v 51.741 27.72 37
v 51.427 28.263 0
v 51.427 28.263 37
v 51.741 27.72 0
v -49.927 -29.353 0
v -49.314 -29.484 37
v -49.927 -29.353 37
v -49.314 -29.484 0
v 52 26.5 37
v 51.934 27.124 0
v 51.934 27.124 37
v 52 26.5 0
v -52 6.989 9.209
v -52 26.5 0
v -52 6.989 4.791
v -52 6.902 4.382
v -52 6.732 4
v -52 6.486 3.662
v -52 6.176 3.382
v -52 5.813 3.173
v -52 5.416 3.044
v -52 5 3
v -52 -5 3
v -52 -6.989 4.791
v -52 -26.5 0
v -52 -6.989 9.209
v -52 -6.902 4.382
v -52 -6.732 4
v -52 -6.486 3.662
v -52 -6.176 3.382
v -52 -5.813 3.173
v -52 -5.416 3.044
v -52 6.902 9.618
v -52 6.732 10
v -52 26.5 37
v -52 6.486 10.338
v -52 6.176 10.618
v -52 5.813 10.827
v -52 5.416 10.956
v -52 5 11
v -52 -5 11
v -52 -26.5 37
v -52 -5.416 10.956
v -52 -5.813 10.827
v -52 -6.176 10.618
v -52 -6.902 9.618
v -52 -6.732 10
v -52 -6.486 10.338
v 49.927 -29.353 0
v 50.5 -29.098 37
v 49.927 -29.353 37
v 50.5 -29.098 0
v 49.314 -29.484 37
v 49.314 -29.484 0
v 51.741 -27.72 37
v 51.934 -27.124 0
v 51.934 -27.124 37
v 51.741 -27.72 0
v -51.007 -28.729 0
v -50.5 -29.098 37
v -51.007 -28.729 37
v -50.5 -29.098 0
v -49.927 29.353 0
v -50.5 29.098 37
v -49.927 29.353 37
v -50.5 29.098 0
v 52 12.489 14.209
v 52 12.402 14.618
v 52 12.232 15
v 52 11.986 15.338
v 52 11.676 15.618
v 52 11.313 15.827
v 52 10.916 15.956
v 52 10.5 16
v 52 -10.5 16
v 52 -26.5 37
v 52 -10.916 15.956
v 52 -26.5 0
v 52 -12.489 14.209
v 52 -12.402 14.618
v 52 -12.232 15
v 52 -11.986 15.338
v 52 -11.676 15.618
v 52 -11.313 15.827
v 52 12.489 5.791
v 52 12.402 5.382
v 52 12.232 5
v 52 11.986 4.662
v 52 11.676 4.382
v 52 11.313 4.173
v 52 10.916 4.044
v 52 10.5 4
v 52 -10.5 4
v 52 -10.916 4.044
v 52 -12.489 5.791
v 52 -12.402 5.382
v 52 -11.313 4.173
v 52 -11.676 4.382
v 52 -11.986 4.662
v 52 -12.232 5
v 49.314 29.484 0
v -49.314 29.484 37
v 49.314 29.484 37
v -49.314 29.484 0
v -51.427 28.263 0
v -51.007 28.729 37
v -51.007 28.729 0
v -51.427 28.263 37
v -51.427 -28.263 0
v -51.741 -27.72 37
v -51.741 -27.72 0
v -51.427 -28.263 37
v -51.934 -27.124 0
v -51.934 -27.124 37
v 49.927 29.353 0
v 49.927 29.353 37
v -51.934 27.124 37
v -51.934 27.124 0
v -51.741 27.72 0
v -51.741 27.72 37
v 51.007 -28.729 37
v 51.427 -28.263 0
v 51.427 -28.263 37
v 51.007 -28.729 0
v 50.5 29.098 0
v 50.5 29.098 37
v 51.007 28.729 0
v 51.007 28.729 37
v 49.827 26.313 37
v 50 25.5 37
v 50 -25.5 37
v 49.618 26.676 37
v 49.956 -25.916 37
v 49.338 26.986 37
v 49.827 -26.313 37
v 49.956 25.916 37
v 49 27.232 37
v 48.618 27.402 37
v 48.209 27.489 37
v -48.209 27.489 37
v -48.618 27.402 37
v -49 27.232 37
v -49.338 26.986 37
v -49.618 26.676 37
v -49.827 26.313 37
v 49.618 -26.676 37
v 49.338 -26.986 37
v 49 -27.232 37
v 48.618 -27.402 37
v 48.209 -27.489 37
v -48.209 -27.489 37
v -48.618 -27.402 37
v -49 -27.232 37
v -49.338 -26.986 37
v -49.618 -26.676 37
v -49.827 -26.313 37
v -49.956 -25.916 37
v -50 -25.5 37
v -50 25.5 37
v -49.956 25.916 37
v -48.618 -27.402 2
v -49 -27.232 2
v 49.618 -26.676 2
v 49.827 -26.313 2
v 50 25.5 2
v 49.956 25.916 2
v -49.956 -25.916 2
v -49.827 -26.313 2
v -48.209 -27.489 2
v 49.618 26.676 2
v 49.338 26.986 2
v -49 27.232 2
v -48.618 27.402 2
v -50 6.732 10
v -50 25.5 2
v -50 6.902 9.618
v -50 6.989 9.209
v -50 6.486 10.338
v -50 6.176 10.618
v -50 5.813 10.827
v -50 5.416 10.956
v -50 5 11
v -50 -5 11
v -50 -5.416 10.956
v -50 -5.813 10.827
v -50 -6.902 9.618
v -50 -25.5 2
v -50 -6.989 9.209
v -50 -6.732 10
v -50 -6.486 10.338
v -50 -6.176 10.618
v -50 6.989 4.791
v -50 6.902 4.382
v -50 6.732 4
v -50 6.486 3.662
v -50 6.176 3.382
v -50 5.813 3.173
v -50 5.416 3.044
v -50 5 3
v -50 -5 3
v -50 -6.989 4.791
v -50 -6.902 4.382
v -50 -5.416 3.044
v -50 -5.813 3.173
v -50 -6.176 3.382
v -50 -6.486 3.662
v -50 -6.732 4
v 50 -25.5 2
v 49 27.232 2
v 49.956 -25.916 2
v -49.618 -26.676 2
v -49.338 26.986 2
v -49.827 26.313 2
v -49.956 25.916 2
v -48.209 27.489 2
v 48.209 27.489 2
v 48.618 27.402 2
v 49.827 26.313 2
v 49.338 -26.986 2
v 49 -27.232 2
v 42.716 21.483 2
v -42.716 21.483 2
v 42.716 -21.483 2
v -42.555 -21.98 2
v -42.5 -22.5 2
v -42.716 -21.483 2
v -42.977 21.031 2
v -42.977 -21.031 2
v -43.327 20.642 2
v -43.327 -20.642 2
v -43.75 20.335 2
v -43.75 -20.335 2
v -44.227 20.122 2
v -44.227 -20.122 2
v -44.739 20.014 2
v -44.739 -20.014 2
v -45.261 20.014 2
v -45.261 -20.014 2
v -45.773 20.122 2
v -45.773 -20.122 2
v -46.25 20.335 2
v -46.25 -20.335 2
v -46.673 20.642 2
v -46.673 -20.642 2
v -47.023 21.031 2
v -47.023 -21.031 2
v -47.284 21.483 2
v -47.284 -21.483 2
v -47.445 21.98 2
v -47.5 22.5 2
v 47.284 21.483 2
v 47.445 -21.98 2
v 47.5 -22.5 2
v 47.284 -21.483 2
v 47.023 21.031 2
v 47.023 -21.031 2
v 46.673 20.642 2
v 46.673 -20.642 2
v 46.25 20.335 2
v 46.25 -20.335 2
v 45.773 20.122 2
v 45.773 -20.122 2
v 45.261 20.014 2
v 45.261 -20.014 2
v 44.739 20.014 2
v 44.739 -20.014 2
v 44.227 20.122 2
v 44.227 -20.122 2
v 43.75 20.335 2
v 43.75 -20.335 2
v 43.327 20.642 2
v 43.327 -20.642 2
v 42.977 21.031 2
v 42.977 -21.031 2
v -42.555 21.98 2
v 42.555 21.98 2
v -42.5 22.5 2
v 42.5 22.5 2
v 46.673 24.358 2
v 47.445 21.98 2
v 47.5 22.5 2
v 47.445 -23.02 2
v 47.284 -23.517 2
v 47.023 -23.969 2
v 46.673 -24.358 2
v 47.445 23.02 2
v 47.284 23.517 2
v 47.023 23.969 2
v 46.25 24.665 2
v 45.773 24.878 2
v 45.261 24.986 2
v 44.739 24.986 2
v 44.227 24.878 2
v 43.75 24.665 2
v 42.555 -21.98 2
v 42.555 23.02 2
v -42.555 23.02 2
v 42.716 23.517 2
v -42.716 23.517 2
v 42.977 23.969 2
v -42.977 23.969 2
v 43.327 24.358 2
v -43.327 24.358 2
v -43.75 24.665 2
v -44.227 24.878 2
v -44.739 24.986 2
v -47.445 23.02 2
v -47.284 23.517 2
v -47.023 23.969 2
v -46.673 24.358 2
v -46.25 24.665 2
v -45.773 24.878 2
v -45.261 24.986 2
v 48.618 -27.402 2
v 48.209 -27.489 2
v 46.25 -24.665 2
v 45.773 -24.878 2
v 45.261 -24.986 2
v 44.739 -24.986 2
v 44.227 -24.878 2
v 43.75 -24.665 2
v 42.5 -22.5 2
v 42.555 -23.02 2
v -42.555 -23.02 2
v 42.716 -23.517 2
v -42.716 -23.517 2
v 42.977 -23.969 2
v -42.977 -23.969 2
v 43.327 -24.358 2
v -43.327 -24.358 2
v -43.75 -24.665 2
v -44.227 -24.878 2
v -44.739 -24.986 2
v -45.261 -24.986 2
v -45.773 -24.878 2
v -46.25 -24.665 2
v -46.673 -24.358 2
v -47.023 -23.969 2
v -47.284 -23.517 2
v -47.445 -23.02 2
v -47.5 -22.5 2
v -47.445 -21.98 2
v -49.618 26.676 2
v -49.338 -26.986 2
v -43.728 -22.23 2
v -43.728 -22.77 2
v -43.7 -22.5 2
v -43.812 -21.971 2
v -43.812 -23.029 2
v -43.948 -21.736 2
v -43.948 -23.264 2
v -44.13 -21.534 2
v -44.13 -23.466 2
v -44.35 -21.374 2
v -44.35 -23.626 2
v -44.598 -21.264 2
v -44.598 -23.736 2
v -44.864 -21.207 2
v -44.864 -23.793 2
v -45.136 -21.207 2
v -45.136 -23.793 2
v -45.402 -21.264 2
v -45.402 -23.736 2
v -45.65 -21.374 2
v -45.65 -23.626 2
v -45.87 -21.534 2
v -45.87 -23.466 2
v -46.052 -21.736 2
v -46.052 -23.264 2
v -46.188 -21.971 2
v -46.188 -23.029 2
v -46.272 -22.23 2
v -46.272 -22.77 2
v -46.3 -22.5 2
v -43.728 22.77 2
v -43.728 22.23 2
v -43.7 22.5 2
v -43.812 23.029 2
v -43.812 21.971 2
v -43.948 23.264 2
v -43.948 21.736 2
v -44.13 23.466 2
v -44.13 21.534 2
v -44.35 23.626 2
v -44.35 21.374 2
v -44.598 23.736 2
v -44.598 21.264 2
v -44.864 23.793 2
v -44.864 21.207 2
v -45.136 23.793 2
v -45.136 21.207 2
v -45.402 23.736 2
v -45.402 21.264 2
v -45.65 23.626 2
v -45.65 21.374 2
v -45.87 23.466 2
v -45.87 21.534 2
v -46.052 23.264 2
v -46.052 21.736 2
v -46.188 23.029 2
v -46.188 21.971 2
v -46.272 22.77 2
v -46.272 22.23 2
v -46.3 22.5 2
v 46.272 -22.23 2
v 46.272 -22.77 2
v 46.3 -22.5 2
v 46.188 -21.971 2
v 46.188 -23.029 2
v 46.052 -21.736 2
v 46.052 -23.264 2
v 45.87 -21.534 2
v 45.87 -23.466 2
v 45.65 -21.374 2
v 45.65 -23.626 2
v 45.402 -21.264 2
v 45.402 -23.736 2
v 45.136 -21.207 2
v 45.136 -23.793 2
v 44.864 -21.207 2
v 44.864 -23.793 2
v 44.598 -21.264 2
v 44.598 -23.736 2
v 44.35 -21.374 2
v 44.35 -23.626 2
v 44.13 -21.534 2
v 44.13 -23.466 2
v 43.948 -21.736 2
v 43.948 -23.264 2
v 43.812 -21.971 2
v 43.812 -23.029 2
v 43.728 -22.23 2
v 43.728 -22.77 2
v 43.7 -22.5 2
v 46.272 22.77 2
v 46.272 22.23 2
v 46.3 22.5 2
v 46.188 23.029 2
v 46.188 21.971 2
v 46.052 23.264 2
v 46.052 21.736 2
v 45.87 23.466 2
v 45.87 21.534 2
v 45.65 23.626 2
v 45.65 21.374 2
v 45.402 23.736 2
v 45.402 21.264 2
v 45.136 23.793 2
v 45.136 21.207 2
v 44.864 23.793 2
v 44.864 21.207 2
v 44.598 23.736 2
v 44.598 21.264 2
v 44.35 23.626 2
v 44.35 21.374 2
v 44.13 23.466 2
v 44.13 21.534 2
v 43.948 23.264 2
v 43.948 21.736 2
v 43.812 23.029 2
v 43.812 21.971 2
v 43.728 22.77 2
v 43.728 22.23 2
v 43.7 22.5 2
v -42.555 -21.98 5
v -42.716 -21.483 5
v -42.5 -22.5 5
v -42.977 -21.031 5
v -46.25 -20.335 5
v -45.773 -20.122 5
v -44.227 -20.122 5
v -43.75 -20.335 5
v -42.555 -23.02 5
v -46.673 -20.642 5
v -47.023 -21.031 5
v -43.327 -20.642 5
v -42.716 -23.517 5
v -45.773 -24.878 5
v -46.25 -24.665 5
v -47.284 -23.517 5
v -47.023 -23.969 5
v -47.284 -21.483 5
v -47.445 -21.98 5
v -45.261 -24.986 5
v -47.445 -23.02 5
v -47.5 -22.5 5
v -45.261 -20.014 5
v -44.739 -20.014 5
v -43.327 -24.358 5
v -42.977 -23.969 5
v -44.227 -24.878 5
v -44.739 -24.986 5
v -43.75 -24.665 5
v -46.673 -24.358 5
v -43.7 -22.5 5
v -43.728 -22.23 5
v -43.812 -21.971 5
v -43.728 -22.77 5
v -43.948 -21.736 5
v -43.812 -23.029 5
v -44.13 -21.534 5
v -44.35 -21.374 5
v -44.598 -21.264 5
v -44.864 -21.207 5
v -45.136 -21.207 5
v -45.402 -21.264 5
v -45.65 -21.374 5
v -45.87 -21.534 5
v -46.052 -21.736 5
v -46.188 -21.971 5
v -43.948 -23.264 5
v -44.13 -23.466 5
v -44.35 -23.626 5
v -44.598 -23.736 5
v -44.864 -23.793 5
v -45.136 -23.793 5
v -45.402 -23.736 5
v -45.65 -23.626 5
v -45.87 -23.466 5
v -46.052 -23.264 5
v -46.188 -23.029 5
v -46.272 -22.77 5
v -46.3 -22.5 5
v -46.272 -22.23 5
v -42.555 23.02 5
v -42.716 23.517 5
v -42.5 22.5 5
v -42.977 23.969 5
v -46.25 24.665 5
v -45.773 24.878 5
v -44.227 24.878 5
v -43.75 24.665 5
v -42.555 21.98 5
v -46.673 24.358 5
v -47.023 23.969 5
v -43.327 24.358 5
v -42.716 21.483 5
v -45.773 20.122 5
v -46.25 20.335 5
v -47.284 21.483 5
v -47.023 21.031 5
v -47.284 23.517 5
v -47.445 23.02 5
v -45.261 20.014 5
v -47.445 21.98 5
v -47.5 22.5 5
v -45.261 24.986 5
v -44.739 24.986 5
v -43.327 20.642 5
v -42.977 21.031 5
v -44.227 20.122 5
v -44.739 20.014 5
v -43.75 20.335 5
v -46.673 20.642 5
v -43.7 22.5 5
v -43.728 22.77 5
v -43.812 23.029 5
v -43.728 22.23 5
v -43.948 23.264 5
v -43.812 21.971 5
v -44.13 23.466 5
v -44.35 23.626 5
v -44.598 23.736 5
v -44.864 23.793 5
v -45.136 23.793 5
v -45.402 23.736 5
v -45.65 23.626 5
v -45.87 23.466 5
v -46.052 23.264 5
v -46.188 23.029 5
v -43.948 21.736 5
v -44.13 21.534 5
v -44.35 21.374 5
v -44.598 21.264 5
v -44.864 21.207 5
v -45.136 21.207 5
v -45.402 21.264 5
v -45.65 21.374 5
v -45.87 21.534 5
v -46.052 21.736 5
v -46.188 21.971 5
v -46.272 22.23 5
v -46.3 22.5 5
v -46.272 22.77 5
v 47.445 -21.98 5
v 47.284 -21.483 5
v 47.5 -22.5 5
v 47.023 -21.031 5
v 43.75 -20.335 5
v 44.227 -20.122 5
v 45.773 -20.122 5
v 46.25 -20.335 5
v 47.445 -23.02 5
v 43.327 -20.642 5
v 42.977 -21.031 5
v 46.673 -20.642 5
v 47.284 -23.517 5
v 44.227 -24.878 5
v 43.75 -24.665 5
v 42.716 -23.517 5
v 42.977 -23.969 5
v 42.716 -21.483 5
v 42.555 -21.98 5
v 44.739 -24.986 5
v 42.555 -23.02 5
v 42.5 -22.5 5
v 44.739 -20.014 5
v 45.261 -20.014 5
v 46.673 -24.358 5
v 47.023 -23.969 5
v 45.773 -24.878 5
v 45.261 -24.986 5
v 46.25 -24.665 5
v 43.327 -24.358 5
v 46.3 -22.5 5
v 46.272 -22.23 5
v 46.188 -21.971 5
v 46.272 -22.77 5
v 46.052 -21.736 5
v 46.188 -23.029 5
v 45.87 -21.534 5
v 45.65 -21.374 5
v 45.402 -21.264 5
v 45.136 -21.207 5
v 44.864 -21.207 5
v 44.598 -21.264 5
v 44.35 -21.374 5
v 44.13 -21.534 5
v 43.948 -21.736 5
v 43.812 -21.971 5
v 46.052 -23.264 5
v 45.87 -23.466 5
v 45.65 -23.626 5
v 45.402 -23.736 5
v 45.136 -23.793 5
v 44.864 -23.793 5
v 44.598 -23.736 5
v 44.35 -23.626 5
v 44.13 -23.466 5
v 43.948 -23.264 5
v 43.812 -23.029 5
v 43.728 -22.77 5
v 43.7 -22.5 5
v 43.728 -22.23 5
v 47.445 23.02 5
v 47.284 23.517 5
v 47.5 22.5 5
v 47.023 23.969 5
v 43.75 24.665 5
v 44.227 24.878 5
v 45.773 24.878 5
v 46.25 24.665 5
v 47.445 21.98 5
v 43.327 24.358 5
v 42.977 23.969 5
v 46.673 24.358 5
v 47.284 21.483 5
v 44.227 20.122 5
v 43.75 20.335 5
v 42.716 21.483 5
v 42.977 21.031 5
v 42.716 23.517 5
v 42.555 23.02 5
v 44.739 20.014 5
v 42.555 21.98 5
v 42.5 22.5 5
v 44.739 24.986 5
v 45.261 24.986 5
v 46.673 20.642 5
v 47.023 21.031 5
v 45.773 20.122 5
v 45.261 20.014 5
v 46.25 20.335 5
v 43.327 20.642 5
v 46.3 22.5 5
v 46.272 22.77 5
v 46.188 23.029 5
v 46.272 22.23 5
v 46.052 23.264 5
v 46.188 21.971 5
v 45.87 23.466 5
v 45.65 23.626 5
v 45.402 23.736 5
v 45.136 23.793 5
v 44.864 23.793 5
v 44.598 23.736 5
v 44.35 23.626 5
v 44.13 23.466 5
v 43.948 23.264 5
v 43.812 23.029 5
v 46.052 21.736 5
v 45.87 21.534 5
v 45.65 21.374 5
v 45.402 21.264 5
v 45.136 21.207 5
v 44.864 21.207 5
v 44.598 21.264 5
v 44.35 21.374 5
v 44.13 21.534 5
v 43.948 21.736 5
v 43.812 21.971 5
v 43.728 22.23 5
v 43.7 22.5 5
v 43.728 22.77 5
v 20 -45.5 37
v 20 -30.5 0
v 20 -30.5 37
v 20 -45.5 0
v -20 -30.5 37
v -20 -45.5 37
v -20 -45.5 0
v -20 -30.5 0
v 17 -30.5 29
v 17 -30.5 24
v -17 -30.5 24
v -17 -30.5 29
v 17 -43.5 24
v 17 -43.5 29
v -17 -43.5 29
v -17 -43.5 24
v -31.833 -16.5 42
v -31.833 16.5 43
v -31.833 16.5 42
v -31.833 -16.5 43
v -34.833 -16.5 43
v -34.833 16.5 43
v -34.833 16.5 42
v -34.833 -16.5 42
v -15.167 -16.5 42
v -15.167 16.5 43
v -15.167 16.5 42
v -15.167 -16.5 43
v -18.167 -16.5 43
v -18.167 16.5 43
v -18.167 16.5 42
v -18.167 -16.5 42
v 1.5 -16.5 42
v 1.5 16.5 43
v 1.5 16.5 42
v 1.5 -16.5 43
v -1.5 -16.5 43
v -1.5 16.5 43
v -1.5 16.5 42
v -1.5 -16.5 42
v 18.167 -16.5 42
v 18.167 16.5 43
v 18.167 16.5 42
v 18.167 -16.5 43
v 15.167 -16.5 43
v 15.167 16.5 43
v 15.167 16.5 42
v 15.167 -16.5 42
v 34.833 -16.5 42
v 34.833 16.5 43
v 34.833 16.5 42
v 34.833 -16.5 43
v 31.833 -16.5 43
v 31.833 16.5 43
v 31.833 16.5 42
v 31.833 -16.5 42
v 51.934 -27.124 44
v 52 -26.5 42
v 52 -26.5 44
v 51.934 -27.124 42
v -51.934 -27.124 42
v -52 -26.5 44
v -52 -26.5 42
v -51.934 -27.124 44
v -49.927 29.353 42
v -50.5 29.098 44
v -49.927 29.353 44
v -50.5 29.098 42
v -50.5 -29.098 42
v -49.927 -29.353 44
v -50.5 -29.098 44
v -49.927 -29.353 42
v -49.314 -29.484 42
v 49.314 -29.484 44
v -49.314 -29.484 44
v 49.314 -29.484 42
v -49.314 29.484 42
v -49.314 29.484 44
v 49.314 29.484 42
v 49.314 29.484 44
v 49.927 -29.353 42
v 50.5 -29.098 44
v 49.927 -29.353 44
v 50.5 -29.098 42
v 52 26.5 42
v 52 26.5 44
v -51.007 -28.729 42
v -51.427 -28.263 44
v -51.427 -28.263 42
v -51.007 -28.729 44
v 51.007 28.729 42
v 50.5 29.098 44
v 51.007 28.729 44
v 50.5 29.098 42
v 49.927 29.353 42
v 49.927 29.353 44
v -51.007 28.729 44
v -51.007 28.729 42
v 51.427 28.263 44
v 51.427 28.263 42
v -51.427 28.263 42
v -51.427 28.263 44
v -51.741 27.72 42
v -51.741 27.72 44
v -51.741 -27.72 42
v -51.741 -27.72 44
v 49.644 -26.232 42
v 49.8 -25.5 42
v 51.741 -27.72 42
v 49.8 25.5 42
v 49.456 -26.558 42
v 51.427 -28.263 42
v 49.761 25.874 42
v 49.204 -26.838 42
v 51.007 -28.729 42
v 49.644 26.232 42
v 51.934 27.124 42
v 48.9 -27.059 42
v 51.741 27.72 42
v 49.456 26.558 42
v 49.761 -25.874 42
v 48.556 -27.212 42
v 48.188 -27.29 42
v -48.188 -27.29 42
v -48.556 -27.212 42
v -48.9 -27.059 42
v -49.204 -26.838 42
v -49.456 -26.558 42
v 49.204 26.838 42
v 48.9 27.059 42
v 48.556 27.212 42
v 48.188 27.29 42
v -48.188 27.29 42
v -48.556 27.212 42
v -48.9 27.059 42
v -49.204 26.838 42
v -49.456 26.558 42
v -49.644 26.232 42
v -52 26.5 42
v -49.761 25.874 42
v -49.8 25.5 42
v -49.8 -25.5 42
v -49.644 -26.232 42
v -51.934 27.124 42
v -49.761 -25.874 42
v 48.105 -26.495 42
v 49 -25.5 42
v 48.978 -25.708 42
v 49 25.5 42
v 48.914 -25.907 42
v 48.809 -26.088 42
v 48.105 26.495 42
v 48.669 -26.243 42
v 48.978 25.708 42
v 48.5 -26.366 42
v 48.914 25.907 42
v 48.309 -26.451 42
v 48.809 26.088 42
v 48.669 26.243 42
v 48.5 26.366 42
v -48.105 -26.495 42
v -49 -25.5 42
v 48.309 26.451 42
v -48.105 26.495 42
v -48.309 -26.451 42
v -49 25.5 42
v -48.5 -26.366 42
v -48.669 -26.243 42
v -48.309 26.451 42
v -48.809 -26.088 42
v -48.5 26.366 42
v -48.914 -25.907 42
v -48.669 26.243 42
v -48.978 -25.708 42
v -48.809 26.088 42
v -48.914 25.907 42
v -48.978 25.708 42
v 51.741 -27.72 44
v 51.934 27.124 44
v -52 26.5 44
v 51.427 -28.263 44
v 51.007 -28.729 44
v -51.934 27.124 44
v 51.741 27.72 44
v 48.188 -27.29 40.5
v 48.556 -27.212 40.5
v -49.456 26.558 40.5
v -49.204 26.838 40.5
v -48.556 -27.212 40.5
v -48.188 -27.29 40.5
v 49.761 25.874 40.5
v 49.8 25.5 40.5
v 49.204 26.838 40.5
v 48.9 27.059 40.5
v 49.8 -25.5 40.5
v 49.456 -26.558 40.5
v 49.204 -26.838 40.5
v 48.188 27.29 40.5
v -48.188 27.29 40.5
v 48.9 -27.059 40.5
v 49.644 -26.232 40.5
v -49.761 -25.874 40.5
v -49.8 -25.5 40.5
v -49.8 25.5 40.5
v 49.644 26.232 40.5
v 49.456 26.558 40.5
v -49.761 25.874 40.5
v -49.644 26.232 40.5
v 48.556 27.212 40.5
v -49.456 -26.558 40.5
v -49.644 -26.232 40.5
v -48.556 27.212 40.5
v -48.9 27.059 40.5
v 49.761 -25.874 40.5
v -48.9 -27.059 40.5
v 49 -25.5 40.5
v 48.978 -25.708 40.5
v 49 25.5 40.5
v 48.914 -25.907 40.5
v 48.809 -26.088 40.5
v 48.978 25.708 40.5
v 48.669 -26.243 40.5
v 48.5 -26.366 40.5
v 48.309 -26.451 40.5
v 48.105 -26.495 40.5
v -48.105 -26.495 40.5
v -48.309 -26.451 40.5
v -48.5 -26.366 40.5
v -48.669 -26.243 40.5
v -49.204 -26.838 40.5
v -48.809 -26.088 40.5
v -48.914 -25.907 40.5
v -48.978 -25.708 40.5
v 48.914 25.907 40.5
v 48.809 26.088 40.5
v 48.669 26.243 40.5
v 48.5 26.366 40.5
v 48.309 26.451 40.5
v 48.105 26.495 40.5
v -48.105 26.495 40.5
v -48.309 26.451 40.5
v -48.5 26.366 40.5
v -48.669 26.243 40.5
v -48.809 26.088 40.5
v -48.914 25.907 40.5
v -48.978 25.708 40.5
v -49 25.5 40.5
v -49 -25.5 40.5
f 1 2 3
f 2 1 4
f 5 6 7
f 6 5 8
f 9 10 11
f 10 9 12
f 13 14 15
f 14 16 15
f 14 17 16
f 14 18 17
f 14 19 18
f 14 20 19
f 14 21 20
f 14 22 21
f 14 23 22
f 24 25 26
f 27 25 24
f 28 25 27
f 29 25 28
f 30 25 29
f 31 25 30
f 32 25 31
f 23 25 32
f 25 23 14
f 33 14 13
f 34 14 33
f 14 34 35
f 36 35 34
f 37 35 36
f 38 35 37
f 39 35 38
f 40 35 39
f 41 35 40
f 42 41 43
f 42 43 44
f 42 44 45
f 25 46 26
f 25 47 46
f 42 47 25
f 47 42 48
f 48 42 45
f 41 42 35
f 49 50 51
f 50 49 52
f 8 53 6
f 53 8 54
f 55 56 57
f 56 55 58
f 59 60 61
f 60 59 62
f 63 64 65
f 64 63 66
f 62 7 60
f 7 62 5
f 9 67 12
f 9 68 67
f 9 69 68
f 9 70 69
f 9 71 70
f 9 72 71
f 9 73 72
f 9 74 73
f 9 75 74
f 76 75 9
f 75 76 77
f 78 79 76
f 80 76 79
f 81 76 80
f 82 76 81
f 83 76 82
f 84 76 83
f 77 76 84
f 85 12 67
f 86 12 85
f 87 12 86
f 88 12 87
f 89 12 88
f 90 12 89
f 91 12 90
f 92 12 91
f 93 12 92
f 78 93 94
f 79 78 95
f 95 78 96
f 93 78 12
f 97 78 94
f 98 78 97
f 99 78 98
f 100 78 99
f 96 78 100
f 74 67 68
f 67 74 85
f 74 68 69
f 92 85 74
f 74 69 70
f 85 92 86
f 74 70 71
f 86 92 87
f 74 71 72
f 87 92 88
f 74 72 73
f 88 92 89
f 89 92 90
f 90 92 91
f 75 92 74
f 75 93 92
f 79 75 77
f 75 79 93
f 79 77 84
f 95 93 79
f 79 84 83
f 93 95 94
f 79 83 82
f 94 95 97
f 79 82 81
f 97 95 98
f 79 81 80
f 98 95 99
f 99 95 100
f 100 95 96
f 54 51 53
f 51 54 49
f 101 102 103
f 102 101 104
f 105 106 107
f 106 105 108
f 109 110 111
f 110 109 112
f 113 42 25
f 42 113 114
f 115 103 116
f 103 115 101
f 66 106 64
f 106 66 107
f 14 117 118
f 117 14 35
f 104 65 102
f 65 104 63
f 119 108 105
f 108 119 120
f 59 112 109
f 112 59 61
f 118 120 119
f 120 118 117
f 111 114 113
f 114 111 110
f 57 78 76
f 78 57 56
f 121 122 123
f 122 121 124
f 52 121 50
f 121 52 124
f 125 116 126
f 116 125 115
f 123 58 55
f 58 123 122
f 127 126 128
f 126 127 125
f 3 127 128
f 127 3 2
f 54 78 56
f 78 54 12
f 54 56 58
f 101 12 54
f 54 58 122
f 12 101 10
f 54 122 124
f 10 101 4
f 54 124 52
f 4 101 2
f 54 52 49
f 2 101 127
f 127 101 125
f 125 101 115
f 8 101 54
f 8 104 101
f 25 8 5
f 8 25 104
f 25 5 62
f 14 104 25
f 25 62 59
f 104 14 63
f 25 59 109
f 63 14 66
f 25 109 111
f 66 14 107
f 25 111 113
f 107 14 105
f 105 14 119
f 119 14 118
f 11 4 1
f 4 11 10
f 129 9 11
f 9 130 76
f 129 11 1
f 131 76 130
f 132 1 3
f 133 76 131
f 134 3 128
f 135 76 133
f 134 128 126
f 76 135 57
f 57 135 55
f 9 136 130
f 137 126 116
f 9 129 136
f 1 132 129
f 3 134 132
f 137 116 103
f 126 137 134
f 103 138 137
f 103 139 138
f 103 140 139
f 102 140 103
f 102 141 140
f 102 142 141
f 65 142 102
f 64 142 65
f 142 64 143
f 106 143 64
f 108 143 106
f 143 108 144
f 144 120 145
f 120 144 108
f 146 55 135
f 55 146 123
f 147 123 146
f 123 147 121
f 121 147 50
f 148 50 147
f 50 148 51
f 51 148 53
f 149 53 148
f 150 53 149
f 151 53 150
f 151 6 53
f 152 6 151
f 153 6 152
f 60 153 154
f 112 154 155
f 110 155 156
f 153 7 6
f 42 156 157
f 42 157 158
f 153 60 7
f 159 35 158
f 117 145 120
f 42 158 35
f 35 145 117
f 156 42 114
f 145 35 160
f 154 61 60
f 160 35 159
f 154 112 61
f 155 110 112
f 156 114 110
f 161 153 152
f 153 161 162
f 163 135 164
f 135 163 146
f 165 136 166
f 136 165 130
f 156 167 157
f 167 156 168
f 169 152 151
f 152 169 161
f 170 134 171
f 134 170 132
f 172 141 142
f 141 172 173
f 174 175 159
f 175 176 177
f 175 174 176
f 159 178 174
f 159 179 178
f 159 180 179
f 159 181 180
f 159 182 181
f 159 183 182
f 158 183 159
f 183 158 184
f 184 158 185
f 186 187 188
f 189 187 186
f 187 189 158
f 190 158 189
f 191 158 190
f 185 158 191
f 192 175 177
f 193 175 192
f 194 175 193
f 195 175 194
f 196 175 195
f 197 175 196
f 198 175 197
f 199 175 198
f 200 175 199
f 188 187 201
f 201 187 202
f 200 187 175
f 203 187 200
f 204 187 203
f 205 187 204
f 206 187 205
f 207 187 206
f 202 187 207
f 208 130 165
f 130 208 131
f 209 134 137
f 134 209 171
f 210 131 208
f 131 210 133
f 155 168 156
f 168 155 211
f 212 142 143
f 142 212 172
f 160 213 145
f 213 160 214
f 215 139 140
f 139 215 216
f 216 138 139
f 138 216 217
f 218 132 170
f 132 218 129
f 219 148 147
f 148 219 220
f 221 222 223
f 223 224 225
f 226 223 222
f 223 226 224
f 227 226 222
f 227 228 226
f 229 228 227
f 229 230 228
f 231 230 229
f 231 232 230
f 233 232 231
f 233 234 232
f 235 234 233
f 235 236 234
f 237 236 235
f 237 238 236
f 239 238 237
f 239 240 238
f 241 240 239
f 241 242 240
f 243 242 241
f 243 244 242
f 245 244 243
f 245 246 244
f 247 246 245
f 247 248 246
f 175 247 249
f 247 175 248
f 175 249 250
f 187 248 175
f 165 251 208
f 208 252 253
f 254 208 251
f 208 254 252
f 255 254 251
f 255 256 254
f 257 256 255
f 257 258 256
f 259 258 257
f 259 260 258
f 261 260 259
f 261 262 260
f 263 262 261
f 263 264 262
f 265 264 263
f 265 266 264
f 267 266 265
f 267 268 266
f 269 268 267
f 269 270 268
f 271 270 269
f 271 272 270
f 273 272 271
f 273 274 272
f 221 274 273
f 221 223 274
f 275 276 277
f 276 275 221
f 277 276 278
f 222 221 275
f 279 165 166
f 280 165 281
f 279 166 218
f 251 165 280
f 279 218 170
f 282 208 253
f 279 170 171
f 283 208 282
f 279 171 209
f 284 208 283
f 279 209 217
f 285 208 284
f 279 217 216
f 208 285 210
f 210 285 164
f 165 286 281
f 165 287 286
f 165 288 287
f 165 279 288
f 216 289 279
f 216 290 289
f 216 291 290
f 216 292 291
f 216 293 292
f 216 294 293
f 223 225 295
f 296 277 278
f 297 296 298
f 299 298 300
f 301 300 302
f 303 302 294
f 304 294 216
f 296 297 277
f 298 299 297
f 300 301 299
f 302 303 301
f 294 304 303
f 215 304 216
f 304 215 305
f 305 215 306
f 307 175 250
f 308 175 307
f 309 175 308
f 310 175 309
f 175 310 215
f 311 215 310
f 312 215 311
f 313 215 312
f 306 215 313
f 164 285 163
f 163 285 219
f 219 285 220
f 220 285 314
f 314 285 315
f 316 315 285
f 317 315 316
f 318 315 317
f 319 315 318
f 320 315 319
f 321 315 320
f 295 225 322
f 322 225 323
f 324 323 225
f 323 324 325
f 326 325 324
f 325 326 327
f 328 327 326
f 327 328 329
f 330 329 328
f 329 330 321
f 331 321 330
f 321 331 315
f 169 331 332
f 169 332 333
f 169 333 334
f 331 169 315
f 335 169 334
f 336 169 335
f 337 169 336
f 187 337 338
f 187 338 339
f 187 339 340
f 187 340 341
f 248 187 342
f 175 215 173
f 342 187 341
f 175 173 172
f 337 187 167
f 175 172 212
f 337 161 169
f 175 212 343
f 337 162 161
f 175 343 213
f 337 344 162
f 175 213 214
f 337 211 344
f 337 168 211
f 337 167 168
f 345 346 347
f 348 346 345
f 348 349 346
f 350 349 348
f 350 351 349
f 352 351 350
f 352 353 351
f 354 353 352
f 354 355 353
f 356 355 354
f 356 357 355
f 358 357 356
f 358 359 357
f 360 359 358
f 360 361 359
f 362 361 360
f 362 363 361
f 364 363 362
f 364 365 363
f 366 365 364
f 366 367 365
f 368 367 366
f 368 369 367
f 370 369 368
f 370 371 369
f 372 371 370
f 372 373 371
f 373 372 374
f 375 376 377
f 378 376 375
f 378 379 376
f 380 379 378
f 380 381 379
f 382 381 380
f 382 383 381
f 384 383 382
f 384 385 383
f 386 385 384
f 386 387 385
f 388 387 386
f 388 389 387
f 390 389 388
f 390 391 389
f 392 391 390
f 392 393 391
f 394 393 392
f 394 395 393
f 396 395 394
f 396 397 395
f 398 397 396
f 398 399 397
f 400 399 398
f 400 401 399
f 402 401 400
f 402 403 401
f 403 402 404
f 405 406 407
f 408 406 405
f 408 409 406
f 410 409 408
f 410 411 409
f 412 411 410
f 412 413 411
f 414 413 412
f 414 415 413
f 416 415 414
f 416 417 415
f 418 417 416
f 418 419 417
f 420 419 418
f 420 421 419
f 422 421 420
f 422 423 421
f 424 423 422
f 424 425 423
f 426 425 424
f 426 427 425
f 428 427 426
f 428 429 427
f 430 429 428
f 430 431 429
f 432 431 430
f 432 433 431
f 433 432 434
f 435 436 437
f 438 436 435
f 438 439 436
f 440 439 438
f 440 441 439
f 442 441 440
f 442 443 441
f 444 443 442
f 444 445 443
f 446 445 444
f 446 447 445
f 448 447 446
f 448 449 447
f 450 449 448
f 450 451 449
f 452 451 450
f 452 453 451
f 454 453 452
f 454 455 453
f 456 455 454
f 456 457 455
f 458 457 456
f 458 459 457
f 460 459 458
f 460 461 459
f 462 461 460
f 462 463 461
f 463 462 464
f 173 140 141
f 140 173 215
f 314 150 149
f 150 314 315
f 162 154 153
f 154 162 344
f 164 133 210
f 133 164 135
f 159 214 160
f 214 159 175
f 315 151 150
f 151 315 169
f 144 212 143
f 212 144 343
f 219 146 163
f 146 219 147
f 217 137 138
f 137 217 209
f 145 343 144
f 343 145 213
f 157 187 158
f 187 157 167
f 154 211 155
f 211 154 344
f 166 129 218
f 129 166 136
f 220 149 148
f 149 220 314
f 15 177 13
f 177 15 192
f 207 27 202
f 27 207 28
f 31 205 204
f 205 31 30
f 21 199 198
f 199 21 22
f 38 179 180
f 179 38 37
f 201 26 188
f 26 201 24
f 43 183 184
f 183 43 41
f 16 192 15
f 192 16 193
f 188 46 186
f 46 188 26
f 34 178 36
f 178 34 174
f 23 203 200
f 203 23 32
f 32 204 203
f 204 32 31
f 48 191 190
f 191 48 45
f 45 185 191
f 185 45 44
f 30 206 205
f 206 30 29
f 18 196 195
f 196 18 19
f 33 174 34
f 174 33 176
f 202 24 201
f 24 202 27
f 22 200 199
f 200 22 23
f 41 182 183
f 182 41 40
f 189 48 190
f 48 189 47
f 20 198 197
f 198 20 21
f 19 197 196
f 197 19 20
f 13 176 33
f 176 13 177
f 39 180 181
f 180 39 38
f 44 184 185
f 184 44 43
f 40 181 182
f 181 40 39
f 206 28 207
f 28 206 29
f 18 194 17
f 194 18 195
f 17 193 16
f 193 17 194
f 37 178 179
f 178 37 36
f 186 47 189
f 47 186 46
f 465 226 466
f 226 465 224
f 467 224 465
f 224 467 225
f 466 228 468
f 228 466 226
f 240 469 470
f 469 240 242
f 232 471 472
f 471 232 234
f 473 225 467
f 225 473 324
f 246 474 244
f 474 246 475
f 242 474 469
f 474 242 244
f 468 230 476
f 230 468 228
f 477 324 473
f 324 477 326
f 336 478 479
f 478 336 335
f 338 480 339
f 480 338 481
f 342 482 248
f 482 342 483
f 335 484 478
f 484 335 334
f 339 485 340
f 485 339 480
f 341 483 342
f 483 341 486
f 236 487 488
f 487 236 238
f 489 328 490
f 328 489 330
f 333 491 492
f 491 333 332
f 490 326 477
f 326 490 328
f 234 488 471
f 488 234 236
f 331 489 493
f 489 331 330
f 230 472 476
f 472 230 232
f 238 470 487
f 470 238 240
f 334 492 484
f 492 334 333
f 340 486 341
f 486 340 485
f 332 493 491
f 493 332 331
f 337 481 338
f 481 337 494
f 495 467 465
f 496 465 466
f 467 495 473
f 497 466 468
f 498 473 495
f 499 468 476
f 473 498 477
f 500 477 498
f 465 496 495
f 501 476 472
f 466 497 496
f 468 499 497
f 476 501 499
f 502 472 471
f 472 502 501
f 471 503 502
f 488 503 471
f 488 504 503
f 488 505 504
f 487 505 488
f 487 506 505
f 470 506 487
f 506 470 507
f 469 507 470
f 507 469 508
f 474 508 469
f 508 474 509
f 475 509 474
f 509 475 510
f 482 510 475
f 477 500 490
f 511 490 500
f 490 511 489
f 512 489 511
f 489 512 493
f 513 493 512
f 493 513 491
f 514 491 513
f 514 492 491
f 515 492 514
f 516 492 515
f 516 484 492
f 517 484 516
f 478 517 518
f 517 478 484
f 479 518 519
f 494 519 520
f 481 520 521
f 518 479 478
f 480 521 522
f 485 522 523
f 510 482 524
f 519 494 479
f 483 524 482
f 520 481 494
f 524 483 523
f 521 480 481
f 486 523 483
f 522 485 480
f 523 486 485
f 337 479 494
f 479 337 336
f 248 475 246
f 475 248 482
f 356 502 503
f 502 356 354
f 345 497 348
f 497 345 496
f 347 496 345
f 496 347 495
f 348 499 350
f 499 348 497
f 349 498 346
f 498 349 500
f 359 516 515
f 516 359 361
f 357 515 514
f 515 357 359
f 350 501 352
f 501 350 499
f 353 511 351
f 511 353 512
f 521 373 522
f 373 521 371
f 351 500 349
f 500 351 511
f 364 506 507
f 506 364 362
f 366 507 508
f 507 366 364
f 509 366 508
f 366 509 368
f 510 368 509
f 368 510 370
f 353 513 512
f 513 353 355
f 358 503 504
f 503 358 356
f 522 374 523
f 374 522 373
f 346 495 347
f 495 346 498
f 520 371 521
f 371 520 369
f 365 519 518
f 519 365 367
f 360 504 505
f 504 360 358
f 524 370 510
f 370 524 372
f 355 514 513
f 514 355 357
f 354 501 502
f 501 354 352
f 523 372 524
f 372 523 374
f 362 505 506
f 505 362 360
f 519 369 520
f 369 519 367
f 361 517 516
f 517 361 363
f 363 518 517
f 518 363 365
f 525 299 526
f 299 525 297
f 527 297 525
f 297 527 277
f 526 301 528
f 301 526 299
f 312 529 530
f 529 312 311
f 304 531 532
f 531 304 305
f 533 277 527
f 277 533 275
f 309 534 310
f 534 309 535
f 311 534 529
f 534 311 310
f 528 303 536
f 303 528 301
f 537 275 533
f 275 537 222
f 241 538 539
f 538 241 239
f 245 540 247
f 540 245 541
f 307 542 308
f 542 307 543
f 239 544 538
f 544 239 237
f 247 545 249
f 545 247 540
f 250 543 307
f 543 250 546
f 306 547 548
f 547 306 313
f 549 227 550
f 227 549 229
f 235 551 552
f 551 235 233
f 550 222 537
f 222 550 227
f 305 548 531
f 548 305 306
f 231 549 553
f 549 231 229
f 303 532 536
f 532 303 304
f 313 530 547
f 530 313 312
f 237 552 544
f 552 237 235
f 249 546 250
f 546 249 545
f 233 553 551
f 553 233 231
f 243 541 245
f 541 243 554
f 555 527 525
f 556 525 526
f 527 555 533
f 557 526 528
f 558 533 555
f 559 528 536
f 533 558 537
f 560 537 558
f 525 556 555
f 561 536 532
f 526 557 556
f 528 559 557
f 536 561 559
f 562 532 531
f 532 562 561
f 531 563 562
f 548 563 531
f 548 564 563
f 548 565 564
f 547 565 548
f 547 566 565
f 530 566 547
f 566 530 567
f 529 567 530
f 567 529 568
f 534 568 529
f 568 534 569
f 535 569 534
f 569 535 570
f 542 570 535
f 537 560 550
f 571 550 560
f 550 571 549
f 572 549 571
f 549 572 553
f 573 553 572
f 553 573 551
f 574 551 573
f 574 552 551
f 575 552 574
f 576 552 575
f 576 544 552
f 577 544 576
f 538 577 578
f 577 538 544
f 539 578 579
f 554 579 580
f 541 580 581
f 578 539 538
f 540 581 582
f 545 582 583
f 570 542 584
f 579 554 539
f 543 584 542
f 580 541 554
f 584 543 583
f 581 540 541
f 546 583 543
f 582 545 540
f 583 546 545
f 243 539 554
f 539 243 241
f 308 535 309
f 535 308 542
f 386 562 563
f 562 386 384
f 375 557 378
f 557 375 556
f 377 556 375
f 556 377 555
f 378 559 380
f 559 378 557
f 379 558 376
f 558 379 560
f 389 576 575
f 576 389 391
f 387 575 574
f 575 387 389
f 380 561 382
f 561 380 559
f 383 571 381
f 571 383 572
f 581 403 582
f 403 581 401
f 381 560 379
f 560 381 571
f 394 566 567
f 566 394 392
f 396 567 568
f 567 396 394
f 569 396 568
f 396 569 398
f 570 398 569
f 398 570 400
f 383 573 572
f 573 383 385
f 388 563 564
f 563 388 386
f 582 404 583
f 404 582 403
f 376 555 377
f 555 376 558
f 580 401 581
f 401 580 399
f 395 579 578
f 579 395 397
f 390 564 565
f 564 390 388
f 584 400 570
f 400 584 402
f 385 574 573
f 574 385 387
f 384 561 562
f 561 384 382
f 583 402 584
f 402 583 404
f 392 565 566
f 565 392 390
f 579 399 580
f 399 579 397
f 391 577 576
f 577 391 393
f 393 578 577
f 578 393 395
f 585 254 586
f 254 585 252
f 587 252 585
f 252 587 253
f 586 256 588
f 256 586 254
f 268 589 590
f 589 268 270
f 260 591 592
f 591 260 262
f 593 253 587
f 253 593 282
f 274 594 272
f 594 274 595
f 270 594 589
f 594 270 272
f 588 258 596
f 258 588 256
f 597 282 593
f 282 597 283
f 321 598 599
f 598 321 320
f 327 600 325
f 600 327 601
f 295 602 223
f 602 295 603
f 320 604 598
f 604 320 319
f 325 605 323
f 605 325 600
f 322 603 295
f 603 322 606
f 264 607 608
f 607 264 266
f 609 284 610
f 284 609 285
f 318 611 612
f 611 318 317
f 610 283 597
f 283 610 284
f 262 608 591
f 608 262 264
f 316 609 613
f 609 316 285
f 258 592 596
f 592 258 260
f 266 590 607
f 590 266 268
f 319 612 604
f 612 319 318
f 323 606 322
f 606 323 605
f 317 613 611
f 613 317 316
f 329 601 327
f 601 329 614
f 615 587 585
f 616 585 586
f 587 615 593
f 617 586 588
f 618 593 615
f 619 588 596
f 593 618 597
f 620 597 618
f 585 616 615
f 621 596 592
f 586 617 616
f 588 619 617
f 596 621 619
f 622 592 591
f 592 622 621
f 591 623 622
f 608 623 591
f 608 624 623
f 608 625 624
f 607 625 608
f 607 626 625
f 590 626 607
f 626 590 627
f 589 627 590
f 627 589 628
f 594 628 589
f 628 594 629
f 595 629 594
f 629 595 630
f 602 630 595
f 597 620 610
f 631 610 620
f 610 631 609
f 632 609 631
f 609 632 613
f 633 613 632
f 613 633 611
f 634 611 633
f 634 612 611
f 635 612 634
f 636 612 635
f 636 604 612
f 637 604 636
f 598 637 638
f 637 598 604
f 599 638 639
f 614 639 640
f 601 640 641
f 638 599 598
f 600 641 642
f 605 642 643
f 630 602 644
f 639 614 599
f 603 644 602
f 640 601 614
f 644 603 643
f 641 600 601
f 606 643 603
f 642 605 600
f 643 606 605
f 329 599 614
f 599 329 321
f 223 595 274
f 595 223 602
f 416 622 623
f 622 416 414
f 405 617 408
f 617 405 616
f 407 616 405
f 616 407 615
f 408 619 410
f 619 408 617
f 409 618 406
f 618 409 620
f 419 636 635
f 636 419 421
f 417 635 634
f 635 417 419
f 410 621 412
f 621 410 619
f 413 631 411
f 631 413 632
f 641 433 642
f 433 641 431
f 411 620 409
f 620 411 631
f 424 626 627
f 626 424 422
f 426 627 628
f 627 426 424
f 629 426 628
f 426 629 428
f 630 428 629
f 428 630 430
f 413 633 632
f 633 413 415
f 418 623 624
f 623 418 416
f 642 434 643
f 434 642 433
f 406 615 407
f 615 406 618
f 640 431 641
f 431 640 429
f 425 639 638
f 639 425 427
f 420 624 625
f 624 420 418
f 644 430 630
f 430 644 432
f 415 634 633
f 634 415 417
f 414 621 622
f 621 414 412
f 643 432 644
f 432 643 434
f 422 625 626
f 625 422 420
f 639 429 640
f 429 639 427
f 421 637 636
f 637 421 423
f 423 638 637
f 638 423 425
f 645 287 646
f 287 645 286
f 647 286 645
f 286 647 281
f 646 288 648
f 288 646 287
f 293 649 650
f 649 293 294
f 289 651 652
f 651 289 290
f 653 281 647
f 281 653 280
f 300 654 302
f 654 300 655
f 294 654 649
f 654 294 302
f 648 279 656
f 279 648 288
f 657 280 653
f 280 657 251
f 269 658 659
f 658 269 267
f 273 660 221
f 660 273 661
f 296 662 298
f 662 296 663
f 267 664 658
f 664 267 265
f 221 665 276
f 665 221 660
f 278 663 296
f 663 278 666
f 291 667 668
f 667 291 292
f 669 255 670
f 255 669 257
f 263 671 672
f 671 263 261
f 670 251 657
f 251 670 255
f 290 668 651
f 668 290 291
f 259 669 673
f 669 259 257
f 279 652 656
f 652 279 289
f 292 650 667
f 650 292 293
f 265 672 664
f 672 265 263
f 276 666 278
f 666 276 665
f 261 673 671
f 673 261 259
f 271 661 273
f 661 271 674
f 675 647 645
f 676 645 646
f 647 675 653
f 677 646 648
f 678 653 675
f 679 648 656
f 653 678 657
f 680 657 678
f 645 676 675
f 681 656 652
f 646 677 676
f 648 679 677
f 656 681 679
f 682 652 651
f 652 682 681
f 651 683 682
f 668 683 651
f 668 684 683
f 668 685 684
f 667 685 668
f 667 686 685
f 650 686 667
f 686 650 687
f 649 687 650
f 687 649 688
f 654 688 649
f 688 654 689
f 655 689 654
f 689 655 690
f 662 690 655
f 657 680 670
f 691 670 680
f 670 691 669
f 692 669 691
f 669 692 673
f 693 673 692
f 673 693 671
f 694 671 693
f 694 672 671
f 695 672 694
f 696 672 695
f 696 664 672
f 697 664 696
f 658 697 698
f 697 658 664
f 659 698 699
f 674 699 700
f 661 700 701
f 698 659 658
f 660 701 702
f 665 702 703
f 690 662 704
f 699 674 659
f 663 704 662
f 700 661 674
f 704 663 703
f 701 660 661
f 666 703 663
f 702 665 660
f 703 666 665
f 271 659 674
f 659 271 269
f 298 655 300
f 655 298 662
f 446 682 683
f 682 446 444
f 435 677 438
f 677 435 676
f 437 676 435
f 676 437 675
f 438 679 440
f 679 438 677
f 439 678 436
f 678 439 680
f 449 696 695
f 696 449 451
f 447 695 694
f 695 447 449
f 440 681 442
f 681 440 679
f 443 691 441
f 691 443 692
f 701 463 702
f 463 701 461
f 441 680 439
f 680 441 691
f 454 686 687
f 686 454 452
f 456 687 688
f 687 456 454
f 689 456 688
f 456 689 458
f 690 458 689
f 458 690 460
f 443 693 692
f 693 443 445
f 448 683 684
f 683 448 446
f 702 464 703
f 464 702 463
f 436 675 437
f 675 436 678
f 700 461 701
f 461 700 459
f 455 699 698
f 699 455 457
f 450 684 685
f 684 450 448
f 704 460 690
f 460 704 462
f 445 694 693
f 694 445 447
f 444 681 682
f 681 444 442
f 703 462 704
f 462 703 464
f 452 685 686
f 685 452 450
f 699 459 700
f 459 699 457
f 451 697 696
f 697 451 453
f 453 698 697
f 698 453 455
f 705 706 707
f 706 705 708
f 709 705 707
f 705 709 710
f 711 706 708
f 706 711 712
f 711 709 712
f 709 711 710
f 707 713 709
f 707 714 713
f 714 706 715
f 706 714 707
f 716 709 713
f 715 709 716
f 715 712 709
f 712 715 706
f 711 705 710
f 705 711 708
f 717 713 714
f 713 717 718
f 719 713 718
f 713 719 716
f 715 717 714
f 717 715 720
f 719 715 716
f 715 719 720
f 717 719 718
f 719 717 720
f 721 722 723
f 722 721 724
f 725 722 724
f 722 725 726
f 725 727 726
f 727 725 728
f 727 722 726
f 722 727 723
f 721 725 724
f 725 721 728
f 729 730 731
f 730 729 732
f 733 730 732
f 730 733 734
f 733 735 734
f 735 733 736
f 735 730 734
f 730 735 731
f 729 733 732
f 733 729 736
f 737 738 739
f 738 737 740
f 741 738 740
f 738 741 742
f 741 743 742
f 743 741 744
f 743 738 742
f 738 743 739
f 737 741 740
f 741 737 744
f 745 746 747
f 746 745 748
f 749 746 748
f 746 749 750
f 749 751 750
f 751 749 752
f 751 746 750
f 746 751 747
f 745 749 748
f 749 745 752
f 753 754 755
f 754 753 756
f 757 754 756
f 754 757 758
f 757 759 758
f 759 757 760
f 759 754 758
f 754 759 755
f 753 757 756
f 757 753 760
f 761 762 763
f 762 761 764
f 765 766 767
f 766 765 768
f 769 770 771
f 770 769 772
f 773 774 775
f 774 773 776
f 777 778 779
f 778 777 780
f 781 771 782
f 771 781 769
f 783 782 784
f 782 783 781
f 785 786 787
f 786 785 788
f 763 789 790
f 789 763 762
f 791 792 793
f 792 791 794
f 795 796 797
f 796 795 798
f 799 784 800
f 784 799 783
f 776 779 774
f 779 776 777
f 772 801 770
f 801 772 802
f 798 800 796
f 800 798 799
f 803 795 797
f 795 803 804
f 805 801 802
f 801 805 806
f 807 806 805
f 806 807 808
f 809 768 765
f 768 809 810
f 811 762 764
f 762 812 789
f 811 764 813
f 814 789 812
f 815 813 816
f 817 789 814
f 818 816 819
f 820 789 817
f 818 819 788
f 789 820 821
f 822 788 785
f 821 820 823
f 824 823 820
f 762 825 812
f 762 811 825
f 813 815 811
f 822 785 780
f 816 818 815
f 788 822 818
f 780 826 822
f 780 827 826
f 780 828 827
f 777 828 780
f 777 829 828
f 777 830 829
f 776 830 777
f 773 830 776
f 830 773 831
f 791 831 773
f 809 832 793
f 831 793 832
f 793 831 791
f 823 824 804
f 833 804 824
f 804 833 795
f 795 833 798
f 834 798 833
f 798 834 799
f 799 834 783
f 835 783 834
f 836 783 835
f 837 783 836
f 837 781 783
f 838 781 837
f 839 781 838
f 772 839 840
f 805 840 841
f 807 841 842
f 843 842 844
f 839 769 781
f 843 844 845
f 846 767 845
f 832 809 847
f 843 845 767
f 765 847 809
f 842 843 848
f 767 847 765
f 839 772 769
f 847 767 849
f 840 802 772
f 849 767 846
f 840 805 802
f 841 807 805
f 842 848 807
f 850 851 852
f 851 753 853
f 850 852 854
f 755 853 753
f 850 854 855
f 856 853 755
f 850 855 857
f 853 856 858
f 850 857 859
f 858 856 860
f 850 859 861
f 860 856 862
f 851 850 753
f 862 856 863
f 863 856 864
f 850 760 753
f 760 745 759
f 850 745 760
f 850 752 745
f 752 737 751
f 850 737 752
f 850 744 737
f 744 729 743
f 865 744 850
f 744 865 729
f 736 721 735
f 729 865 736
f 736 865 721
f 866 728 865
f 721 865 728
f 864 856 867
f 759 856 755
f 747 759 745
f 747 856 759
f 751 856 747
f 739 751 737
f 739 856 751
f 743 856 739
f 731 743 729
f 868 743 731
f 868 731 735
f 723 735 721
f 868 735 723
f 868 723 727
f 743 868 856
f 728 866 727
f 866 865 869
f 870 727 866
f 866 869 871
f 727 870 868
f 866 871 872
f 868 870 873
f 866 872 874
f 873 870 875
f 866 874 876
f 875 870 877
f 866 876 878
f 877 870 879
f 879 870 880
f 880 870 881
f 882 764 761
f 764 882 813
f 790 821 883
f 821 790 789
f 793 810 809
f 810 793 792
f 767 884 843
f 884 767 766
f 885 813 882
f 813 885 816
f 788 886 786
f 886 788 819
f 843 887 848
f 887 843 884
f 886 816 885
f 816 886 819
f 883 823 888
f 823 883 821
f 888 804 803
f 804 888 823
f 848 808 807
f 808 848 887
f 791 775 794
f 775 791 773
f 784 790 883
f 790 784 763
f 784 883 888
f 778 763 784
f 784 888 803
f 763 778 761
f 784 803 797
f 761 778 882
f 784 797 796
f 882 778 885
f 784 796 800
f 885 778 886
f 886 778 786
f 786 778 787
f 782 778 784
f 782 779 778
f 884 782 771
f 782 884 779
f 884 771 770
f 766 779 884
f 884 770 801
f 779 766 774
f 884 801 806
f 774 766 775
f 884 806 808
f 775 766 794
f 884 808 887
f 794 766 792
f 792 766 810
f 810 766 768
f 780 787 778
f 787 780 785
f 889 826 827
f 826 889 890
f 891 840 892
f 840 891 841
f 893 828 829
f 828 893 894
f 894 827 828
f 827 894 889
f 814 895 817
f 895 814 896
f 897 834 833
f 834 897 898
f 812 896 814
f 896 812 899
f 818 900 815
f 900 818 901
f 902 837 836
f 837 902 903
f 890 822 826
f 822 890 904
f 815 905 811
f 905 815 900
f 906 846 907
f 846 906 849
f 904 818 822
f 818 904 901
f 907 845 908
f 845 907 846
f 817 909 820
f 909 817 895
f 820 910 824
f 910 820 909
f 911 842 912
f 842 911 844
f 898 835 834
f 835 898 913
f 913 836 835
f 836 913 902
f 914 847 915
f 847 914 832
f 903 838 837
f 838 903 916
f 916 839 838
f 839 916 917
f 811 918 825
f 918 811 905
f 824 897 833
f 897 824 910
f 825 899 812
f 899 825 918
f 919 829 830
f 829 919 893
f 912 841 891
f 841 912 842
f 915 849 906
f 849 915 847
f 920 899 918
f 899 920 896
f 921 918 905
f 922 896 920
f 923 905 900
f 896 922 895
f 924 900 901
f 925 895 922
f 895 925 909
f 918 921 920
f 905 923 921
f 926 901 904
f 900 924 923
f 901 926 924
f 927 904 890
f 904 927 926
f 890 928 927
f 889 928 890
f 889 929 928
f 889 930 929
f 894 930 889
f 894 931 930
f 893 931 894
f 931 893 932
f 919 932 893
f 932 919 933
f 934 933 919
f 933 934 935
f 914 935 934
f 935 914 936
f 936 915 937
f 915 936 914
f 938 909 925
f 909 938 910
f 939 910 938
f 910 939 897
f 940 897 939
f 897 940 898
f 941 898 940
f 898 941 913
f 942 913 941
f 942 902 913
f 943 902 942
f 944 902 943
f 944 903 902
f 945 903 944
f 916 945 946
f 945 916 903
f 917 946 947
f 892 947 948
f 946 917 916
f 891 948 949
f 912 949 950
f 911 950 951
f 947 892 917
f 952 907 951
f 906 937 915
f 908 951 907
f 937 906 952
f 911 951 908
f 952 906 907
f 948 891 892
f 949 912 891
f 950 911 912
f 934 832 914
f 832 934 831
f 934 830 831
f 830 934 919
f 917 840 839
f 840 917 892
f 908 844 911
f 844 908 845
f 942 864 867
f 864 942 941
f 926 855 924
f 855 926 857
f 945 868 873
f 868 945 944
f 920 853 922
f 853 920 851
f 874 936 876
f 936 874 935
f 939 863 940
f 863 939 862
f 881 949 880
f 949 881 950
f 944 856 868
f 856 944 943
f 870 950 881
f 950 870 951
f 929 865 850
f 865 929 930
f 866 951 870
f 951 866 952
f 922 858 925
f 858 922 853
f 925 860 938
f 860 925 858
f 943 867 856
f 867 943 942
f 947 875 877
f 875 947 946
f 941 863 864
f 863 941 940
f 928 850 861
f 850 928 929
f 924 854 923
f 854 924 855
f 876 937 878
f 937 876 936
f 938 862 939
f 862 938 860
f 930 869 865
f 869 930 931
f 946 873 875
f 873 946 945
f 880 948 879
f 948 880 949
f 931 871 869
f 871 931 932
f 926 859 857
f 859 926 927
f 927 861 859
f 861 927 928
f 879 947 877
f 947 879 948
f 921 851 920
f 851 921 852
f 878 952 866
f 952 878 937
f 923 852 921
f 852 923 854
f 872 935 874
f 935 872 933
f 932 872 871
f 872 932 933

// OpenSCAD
// Electronics Belt Box
// Holds Arduino Due + NeuroStimDuino stacked
//
// Parameters
inner_length = 100;     // Arduino Due ~101mm, snug fit
inner_width = 55;       // Arduino Due ~53mm + clearance
inner_height = 35;      // Stack height: Due (~11mm) + shield (~15mm) + cables
wall = 2.0;             // Wall thickness (mm)
corner_r = 3;           // Corner radius (mm)
lid_lip = 1.5;          // Lid engagement depth (mm)
vent_slots = 5;         // Number of ventilation slots
cable_port_w = 25;      // Cable exit port width (mm)
cable_port_h = 12;      // Cable exit port height (mm)
belt_clip_w = 40;       // Belt clip width (mm)
belt_clip_gap = 5;      // Belt clip gap (belt thickness) (mm)
belt_clip_depth = 15;   // Belt clip depth (mm)
$fn = 30;

module rounded_box(l, w, h, r) {
    hull() {
        for (x = [-l/2 + r, l/2 - r])
            for (y = [-w/2 + r, w/2 - r])
                translate([x, y, 0])
                    cylinder(r=r, h=h);
    }
}

module box_body() {
    difference() {
        // Outer shell
        rounded_box(inner_length + wall*2, inner_width + wall*2,
                     inner_height + wall, corner_r);

        // Inner cavity
        translate([0, 0, wall])
            rounded_box(inner_length, inner_width,
                         inner_height + 1, corner_r - wall/2);

        // Cable exit port (one short end)
        translate([inner_length/2 + wall, 0, wall + cable_port_h/2 + 2])
            rotate([0, 90, 0])
                rounded_box(cable_port_h, cable_port_w, wall * 3, 2);

        // Ventilation slots (top)
        for (i = [0:vent_slots-1]) {
            x_pos = -inner_length/3 + i * (inner_length * 2/3) / (vent_slots - 1);
            translate([x_pos, 0, inner_height + wall - 0.1])
                cube([3, inner_width * 0.6, wall + 0.2], center=true);
        }

        // USB access port (other short end, for programming)
        translate([-(inner_length/2 + wall), 0, wall + 5])
            rotate([0, 90, 0])
                rounded_box(8, 14, wall * 3, 2);
    }

    // Arduino mounting posts (4 corners, M3)
    for (x = [-inner_length/2 + 5, inner_length/2 - 5])
        for (y = [-inner_width/2 + 5, inner_width/2 - 5])
            translate([x, y, wall])
                difference() {
                    cylinder(r=2.5, h=3);
                    translate([0, 0, -0.1])
                        cylinder(r=1.3, h=3.2);  // M3 hole
                }
}

module belt_clip() {
    translate([0, -(inner_width/2 + wall + 1), 0]) {
        // Main clip body
        difference() {
            translate([-belt_clip_w/2, -belt_clip_depth, 0])
                cube([belt_clip_w, belt_clip_depth, inner_height + wall]);

            // Belt gap
            translate([-belt_clip_w/2 + 3, -belt_clip_depth + 2, inner_height + wall - belt_clip_gap - 8])
                cube([belt_clip_w - 6, belt_clip_depth, belt_clip_gap]);
        }
    }
}

module lid() {
    translate([0, 0, inner_height + wall + 5]) {  // Offset for display
        difference() {
            rounded_box(inner_length + wall*2, inner_width + wall*2,
                         wall, corner_r);

            // Vent slots matching body
            for (i = [0:vent_slots-1]) {
                x_pos = -inner_length/3 + i * (inner_length * 2/3) / (vent_slots - 1);
                translate([x_pos, 0, -0.1])
                    cube([3, inner_width * 0.6, wall + 0.2], center=true);
            }
        }

        // Lid engagement lip
        translate([0, 0, -lid_lip])
            difference() {
                rounded_box(inner_length - 0.4, inner_width - 0.4,
                             lid_lip, corner_r - wall/2 - 0.2);
                rounded_box(inner_length - wall, inner_width - wall,
                             lid_lip + 0.2, corner_r - wall);
            }
    }
}

// Assemble — box + belt clip + lid (offset above for printing)
box_body();
belt_clip();
lid();
